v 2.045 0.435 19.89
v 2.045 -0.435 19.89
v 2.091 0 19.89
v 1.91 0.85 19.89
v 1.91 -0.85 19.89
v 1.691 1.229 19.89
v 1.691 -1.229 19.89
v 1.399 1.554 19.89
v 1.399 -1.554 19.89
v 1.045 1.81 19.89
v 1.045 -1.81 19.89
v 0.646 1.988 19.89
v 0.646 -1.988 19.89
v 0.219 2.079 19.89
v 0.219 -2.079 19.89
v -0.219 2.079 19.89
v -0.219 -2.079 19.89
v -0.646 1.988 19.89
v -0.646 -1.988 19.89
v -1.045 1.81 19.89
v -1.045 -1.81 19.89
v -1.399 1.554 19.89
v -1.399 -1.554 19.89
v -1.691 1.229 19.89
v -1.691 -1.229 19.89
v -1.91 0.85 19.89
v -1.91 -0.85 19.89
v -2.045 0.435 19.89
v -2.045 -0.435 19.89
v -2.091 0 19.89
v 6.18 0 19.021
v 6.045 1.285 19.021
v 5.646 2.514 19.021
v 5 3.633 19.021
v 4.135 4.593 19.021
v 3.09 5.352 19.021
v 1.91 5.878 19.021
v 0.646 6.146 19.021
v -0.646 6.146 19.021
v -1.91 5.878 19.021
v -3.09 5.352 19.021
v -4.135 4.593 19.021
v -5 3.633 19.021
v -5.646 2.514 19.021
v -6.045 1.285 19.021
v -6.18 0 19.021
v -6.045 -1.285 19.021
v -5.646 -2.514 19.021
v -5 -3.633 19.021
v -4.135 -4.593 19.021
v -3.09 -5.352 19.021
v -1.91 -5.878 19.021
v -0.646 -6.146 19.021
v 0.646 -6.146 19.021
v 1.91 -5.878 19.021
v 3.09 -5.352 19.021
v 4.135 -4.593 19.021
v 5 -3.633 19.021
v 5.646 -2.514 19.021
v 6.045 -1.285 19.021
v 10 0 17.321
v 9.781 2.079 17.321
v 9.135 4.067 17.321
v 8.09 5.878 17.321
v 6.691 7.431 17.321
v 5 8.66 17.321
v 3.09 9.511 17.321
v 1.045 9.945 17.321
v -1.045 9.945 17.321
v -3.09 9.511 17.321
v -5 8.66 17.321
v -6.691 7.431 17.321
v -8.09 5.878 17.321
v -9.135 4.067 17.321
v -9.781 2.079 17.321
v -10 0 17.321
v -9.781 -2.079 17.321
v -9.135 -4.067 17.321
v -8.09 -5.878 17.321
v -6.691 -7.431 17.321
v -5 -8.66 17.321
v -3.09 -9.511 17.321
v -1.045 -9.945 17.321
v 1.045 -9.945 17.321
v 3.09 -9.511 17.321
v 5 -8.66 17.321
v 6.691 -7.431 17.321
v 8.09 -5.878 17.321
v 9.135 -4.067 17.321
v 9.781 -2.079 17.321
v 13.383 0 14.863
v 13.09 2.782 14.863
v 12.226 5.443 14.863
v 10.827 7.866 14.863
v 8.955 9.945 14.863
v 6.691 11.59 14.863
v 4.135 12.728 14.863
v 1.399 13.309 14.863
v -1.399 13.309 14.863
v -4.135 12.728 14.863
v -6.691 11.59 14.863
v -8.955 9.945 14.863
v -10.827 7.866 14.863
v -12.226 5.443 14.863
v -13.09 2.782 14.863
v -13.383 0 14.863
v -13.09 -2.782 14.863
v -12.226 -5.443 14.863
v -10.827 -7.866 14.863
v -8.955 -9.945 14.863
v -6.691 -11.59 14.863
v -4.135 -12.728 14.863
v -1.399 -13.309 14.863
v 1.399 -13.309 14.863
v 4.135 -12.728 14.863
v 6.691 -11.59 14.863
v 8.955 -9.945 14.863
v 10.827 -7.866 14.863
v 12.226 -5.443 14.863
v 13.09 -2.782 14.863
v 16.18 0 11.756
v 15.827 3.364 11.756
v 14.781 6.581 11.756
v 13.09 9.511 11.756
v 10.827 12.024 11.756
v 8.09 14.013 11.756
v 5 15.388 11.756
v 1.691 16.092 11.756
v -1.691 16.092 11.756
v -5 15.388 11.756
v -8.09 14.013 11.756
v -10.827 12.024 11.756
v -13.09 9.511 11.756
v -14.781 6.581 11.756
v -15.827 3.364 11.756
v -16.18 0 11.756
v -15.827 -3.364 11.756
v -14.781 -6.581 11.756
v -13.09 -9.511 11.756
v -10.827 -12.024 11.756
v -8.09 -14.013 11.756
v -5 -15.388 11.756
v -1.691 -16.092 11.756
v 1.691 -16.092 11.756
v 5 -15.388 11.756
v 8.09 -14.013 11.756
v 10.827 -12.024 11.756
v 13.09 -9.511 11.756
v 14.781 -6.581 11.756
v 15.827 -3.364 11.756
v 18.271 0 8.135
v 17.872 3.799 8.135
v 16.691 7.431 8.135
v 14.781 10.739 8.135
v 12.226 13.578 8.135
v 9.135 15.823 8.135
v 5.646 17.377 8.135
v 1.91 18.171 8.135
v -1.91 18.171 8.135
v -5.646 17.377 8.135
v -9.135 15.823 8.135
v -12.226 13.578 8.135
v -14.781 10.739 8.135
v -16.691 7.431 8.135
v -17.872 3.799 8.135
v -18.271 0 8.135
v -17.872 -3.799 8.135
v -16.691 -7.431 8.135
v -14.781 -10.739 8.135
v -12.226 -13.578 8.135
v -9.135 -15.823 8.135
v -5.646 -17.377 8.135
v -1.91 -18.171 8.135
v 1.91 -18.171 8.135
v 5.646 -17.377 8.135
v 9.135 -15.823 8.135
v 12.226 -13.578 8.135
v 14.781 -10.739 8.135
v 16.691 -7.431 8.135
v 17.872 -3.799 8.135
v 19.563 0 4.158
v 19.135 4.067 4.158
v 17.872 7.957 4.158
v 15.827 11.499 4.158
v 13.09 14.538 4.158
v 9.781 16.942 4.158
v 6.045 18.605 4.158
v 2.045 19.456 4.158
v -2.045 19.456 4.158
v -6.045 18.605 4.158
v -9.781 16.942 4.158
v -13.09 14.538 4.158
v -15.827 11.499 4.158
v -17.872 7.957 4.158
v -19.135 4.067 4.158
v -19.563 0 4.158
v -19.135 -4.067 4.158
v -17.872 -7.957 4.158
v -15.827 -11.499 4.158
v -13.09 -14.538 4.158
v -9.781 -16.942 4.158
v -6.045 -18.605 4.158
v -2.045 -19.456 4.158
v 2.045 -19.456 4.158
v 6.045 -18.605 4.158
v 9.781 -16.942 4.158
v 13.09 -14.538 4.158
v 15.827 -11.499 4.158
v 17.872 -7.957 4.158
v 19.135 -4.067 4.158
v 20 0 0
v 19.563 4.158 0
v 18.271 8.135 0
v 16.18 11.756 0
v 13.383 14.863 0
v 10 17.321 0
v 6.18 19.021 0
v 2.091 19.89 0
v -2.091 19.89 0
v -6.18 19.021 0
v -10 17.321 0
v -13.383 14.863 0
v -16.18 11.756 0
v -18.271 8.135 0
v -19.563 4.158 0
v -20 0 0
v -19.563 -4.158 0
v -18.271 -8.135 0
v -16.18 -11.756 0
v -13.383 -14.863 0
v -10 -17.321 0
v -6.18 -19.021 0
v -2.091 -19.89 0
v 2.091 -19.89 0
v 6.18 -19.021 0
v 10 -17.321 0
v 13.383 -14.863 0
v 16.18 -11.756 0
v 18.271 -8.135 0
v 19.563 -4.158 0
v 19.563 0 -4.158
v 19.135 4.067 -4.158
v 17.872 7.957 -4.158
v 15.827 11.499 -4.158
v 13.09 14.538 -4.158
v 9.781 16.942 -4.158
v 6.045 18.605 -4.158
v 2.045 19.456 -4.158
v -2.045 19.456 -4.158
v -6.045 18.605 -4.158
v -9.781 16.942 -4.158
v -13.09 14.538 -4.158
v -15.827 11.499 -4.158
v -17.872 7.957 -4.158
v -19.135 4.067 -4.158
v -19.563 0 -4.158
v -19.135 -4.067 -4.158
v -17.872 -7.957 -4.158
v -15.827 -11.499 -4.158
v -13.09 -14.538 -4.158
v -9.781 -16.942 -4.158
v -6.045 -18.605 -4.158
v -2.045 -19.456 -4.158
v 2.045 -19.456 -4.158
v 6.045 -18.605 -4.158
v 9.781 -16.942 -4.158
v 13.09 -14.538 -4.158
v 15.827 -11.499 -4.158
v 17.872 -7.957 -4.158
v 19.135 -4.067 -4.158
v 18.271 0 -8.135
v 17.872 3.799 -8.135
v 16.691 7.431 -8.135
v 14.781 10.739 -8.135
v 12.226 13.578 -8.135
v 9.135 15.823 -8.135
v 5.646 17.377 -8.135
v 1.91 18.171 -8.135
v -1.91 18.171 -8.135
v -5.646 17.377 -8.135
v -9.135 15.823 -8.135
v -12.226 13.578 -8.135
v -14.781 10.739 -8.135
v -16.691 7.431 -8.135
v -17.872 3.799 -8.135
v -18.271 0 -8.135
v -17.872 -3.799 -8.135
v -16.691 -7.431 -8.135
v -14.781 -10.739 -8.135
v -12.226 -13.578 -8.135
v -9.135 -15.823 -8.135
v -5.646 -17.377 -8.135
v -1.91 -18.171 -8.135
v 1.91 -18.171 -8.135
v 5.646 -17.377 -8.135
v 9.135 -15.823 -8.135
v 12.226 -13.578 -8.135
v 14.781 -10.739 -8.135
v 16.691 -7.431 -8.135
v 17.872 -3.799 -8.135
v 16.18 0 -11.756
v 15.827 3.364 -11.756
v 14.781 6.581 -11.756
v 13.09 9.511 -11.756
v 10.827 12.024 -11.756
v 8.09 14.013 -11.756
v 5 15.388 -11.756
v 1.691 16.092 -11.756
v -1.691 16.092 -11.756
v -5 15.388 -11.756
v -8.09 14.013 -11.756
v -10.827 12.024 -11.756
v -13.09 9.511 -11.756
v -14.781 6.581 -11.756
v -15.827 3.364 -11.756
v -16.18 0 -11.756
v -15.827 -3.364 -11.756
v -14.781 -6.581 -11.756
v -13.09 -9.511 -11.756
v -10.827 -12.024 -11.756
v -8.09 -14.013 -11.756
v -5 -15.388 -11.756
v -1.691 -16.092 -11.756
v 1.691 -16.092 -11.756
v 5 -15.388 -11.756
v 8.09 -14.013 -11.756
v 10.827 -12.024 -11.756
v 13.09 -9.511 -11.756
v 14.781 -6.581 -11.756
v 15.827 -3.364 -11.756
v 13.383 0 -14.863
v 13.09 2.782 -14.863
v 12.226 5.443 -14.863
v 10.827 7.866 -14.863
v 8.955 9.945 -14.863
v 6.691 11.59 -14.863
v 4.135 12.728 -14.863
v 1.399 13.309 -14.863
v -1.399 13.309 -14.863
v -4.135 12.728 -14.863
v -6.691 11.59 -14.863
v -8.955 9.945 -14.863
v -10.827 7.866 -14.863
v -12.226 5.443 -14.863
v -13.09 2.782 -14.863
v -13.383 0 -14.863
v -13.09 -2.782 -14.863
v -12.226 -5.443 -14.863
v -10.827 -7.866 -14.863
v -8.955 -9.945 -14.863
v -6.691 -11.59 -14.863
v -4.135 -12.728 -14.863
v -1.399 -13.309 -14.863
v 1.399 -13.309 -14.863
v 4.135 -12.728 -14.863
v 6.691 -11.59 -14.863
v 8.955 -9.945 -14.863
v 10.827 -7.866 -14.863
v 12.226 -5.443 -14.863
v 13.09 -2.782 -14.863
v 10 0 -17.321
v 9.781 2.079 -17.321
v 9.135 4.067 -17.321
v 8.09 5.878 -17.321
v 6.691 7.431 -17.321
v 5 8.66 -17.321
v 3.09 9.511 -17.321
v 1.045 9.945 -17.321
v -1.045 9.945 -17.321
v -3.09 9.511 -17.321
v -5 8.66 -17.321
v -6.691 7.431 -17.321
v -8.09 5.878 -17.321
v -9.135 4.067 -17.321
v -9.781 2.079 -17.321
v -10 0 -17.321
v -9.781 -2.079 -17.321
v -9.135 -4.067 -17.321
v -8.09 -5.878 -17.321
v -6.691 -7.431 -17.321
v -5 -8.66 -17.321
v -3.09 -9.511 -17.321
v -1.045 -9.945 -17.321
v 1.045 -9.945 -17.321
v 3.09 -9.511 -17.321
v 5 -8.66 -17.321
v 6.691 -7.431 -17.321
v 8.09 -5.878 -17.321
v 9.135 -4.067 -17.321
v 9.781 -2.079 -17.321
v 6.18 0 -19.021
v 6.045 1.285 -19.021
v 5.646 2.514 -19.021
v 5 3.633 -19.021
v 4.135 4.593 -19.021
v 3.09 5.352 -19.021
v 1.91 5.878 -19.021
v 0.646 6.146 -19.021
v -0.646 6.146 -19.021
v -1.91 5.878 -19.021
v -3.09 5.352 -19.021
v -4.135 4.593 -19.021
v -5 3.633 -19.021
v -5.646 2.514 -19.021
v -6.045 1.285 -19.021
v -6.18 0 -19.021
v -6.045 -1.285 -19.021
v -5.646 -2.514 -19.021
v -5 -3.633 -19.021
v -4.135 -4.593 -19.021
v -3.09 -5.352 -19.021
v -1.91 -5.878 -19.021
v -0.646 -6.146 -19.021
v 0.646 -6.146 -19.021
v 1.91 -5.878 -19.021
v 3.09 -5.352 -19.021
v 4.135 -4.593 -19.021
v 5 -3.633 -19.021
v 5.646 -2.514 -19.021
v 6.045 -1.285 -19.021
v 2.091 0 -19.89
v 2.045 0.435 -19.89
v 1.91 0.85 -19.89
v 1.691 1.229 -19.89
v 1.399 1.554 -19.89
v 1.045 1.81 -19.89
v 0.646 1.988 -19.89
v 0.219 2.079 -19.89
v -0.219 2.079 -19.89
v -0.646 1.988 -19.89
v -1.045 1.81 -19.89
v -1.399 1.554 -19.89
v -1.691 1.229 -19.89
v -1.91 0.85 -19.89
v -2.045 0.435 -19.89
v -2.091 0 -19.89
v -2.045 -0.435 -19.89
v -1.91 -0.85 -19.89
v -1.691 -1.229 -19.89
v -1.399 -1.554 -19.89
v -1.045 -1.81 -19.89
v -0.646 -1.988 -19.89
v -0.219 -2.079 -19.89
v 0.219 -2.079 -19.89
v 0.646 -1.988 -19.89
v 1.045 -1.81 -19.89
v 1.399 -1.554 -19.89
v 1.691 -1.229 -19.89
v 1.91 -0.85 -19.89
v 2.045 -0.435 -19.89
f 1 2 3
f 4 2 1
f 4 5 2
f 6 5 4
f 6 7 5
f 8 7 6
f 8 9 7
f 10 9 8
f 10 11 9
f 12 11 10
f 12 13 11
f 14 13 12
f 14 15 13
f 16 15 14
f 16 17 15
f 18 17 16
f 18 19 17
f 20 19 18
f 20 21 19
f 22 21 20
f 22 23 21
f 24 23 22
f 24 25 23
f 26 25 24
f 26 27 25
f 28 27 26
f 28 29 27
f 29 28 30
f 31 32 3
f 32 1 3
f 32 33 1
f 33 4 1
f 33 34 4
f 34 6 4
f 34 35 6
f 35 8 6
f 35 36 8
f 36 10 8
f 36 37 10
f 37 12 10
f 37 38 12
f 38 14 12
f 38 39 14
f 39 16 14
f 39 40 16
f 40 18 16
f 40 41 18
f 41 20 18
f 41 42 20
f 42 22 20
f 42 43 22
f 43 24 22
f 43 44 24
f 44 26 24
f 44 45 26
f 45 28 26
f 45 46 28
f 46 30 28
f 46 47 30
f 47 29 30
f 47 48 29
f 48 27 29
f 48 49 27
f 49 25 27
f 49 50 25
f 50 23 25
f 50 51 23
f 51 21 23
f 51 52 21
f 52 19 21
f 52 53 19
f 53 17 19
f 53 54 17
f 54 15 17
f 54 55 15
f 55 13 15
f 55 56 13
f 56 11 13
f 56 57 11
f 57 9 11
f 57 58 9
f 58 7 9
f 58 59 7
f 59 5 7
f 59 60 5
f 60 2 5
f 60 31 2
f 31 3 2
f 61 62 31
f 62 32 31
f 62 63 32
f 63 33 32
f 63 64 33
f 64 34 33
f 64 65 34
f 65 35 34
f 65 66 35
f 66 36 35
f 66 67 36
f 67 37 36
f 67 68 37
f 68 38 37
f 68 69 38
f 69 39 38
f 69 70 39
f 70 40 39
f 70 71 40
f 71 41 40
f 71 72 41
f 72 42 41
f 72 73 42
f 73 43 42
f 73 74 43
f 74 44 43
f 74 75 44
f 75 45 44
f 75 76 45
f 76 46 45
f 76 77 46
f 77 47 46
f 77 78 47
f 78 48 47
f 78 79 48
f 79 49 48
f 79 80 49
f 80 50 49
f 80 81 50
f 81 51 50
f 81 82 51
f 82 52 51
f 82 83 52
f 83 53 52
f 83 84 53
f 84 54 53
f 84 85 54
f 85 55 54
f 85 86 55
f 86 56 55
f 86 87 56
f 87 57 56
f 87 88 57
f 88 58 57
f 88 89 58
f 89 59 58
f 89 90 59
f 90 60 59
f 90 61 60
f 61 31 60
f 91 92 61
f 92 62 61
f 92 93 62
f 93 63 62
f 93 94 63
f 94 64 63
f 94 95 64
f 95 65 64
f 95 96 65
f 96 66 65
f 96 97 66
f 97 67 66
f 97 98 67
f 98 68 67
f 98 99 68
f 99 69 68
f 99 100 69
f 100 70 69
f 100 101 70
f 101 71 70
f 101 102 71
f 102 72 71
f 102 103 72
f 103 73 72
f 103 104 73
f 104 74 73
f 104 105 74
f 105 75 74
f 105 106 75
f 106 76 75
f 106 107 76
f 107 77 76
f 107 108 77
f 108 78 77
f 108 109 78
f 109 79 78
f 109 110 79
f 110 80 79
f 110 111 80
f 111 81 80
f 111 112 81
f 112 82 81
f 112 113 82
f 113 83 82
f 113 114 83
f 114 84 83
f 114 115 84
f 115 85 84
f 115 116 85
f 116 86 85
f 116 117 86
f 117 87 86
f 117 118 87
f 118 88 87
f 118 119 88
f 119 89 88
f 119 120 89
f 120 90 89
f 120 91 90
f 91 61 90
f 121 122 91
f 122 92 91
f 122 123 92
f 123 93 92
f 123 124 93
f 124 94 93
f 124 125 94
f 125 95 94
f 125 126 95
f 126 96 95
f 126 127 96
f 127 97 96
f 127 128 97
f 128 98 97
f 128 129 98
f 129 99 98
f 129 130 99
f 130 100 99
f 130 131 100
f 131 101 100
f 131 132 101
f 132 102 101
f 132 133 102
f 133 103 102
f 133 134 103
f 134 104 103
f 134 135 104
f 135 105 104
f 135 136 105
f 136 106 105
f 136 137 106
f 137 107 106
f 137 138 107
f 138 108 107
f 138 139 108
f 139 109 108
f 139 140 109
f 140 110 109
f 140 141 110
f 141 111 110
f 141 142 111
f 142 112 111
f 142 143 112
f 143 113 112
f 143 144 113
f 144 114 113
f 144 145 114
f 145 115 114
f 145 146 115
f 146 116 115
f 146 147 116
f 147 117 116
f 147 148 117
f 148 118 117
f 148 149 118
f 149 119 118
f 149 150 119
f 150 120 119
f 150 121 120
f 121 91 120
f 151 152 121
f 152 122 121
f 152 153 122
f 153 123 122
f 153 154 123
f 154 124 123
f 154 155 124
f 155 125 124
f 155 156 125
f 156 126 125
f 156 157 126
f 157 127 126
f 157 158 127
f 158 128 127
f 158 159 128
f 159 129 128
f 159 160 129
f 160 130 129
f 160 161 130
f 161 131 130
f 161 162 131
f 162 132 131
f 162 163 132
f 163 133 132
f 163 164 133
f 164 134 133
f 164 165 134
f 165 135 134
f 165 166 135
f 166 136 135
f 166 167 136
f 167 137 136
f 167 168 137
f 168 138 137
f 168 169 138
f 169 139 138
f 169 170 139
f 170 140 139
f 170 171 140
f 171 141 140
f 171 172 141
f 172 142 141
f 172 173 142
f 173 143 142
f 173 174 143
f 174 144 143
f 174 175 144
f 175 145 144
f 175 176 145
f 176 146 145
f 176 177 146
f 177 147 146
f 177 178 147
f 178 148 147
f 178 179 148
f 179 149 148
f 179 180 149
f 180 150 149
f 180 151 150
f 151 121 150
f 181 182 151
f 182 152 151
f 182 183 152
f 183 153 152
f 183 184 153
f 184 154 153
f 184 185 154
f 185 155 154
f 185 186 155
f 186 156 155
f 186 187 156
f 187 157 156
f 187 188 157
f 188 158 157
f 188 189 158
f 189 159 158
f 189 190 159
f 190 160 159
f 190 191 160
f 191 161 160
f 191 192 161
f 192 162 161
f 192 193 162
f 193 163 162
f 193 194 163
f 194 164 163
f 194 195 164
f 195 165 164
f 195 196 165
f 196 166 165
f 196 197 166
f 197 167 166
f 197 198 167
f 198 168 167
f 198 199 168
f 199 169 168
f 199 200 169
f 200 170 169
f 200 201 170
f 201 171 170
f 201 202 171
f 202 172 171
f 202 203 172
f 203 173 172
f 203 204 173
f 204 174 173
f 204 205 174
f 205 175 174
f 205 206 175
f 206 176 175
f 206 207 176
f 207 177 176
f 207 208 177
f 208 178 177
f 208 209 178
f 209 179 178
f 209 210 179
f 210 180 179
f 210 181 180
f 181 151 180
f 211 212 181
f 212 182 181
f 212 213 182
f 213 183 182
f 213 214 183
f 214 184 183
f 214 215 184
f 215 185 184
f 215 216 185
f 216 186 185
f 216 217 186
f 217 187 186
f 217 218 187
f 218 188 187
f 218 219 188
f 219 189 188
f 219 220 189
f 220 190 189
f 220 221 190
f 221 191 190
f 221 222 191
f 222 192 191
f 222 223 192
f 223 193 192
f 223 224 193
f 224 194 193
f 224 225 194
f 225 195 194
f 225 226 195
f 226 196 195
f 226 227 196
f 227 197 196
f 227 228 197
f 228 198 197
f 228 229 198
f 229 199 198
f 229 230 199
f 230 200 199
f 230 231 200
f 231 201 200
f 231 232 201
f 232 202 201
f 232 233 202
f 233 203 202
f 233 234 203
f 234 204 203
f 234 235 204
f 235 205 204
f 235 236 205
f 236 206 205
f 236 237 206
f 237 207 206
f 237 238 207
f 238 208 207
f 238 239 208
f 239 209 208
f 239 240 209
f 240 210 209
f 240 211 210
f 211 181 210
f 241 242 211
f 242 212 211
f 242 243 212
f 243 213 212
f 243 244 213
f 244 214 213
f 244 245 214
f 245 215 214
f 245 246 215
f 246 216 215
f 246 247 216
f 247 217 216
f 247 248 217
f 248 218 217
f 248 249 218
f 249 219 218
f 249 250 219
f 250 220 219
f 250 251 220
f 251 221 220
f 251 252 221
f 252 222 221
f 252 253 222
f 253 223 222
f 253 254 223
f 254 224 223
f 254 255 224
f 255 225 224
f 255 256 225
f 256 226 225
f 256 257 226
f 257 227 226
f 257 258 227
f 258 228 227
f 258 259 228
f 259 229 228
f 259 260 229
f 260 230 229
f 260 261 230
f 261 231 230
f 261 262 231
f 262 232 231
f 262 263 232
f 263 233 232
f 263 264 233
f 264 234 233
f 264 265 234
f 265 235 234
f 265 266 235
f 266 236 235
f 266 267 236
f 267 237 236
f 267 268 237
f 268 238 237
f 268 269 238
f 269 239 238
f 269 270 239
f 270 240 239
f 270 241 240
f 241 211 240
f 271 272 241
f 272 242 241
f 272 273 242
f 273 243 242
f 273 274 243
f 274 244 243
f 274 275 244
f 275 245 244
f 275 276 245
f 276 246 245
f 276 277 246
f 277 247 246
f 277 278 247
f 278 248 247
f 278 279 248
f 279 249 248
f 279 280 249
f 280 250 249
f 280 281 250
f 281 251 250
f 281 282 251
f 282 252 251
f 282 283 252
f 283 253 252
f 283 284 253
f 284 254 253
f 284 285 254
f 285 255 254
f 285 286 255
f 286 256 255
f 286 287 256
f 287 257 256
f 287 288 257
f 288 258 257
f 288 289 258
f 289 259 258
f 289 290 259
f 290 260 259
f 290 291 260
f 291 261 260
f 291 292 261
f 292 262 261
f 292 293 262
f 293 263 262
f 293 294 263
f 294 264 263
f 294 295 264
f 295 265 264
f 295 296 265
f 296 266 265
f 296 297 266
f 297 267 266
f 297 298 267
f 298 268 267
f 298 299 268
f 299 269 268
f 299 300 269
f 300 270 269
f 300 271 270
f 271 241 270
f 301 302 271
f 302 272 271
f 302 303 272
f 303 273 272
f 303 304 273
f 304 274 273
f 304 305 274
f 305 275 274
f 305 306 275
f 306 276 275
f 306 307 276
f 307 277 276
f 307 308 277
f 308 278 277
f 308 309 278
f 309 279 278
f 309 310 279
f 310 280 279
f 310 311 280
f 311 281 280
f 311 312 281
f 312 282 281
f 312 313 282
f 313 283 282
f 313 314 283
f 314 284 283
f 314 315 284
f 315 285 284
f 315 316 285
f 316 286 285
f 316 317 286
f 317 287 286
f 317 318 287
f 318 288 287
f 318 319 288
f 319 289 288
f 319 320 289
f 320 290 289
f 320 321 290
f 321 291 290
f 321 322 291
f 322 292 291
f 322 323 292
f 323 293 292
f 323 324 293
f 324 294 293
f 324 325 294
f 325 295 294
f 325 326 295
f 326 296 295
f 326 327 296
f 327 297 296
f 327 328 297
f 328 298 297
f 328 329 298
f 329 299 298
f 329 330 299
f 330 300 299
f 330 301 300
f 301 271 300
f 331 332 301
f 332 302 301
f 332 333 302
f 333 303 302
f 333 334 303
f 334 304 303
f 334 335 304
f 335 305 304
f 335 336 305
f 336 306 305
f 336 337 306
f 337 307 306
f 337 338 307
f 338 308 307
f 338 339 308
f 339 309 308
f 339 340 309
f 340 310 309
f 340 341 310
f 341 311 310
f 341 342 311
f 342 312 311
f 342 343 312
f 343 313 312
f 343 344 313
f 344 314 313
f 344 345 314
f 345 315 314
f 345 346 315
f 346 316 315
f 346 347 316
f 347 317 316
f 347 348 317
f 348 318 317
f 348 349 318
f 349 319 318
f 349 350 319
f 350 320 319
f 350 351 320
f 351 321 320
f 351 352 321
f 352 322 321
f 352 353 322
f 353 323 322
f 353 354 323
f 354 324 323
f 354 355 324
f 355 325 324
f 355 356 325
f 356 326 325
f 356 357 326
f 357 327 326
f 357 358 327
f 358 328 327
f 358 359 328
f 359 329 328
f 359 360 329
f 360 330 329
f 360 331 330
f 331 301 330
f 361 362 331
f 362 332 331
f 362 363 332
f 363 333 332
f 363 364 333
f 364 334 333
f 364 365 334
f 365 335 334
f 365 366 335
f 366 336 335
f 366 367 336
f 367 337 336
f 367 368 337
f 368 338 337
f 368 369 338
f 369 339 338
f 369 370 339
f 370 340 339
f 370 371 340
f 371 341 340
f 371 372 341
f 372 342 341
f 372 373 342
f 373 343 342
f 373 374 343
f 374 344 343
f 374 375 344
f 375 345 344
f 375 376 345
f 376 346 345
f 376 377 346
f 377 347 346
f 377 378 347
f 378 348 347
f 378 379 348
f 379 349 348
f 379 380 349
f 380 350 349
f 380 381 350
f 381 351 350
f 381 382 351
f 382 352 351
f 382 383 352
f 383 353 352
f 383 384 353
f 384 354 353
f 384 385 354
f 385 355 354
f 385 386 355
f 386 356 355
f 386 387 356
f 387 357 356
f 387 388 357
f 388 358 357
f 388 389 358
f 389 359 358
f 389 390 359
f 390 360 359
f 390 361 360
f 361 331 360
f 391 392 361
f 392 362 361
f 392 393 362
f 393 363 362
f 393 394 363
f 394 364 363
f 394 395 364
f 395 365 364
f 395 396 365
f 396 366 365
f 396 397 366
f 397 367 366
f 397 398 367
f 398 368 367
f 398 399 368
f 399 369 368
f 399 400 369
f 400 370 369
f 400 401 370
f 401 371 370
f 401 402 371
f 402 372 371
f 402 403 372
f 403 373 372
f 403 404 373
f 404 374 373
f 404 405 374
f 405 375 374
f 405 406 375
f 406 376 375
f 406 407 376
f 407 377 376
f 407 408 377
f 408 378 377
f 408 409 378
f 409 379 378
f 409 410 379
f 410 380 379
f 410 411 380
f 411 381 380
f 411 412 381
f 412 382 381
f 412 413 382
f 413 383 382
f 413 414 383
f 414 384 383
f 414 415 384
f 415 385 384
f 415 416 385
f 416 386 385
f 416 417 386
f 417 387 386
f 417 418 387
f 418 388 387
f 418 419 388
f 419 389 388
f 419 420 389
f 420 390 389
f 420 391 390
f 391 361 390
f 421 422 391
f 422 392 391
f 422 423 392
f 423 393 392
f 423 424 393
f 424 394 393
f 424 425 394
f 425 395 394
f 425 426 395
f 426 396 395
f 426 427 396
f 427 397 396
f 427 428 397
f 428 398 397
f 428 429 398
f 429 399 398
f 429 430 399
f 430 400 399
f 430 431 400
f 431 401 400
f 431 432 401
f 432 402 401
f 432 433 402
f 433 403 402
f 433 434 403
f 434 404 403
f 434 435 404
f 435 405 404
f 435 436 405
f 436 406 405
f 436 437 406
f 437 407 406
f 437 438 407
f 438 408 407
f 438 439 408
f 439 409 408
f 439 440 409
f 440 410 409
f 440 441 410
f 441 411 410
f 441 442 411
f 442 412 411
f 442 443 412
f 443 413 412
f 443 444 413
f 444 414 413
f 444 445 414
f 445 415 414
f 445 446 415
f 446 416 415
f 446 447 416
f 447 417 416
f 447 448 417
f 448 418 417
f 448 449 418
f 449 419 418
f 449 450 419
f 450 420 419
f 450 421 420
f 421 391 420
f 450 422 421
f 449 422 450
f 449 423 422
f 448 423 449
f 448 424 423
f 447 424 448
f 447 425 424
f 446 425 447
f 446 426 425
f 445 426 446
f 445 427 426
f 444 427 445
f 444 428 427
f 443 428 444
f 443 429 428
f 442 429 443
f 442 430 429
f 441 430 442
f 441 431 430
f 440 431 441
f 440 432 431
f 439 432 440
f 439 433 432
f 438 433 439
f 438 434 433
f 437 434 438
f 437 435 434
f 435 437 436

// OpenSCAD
// Basic_Shape_05.scad
// Sphere

// sphere : diameter or radius
sphere(r = 20);
//sphere(d = 40);
